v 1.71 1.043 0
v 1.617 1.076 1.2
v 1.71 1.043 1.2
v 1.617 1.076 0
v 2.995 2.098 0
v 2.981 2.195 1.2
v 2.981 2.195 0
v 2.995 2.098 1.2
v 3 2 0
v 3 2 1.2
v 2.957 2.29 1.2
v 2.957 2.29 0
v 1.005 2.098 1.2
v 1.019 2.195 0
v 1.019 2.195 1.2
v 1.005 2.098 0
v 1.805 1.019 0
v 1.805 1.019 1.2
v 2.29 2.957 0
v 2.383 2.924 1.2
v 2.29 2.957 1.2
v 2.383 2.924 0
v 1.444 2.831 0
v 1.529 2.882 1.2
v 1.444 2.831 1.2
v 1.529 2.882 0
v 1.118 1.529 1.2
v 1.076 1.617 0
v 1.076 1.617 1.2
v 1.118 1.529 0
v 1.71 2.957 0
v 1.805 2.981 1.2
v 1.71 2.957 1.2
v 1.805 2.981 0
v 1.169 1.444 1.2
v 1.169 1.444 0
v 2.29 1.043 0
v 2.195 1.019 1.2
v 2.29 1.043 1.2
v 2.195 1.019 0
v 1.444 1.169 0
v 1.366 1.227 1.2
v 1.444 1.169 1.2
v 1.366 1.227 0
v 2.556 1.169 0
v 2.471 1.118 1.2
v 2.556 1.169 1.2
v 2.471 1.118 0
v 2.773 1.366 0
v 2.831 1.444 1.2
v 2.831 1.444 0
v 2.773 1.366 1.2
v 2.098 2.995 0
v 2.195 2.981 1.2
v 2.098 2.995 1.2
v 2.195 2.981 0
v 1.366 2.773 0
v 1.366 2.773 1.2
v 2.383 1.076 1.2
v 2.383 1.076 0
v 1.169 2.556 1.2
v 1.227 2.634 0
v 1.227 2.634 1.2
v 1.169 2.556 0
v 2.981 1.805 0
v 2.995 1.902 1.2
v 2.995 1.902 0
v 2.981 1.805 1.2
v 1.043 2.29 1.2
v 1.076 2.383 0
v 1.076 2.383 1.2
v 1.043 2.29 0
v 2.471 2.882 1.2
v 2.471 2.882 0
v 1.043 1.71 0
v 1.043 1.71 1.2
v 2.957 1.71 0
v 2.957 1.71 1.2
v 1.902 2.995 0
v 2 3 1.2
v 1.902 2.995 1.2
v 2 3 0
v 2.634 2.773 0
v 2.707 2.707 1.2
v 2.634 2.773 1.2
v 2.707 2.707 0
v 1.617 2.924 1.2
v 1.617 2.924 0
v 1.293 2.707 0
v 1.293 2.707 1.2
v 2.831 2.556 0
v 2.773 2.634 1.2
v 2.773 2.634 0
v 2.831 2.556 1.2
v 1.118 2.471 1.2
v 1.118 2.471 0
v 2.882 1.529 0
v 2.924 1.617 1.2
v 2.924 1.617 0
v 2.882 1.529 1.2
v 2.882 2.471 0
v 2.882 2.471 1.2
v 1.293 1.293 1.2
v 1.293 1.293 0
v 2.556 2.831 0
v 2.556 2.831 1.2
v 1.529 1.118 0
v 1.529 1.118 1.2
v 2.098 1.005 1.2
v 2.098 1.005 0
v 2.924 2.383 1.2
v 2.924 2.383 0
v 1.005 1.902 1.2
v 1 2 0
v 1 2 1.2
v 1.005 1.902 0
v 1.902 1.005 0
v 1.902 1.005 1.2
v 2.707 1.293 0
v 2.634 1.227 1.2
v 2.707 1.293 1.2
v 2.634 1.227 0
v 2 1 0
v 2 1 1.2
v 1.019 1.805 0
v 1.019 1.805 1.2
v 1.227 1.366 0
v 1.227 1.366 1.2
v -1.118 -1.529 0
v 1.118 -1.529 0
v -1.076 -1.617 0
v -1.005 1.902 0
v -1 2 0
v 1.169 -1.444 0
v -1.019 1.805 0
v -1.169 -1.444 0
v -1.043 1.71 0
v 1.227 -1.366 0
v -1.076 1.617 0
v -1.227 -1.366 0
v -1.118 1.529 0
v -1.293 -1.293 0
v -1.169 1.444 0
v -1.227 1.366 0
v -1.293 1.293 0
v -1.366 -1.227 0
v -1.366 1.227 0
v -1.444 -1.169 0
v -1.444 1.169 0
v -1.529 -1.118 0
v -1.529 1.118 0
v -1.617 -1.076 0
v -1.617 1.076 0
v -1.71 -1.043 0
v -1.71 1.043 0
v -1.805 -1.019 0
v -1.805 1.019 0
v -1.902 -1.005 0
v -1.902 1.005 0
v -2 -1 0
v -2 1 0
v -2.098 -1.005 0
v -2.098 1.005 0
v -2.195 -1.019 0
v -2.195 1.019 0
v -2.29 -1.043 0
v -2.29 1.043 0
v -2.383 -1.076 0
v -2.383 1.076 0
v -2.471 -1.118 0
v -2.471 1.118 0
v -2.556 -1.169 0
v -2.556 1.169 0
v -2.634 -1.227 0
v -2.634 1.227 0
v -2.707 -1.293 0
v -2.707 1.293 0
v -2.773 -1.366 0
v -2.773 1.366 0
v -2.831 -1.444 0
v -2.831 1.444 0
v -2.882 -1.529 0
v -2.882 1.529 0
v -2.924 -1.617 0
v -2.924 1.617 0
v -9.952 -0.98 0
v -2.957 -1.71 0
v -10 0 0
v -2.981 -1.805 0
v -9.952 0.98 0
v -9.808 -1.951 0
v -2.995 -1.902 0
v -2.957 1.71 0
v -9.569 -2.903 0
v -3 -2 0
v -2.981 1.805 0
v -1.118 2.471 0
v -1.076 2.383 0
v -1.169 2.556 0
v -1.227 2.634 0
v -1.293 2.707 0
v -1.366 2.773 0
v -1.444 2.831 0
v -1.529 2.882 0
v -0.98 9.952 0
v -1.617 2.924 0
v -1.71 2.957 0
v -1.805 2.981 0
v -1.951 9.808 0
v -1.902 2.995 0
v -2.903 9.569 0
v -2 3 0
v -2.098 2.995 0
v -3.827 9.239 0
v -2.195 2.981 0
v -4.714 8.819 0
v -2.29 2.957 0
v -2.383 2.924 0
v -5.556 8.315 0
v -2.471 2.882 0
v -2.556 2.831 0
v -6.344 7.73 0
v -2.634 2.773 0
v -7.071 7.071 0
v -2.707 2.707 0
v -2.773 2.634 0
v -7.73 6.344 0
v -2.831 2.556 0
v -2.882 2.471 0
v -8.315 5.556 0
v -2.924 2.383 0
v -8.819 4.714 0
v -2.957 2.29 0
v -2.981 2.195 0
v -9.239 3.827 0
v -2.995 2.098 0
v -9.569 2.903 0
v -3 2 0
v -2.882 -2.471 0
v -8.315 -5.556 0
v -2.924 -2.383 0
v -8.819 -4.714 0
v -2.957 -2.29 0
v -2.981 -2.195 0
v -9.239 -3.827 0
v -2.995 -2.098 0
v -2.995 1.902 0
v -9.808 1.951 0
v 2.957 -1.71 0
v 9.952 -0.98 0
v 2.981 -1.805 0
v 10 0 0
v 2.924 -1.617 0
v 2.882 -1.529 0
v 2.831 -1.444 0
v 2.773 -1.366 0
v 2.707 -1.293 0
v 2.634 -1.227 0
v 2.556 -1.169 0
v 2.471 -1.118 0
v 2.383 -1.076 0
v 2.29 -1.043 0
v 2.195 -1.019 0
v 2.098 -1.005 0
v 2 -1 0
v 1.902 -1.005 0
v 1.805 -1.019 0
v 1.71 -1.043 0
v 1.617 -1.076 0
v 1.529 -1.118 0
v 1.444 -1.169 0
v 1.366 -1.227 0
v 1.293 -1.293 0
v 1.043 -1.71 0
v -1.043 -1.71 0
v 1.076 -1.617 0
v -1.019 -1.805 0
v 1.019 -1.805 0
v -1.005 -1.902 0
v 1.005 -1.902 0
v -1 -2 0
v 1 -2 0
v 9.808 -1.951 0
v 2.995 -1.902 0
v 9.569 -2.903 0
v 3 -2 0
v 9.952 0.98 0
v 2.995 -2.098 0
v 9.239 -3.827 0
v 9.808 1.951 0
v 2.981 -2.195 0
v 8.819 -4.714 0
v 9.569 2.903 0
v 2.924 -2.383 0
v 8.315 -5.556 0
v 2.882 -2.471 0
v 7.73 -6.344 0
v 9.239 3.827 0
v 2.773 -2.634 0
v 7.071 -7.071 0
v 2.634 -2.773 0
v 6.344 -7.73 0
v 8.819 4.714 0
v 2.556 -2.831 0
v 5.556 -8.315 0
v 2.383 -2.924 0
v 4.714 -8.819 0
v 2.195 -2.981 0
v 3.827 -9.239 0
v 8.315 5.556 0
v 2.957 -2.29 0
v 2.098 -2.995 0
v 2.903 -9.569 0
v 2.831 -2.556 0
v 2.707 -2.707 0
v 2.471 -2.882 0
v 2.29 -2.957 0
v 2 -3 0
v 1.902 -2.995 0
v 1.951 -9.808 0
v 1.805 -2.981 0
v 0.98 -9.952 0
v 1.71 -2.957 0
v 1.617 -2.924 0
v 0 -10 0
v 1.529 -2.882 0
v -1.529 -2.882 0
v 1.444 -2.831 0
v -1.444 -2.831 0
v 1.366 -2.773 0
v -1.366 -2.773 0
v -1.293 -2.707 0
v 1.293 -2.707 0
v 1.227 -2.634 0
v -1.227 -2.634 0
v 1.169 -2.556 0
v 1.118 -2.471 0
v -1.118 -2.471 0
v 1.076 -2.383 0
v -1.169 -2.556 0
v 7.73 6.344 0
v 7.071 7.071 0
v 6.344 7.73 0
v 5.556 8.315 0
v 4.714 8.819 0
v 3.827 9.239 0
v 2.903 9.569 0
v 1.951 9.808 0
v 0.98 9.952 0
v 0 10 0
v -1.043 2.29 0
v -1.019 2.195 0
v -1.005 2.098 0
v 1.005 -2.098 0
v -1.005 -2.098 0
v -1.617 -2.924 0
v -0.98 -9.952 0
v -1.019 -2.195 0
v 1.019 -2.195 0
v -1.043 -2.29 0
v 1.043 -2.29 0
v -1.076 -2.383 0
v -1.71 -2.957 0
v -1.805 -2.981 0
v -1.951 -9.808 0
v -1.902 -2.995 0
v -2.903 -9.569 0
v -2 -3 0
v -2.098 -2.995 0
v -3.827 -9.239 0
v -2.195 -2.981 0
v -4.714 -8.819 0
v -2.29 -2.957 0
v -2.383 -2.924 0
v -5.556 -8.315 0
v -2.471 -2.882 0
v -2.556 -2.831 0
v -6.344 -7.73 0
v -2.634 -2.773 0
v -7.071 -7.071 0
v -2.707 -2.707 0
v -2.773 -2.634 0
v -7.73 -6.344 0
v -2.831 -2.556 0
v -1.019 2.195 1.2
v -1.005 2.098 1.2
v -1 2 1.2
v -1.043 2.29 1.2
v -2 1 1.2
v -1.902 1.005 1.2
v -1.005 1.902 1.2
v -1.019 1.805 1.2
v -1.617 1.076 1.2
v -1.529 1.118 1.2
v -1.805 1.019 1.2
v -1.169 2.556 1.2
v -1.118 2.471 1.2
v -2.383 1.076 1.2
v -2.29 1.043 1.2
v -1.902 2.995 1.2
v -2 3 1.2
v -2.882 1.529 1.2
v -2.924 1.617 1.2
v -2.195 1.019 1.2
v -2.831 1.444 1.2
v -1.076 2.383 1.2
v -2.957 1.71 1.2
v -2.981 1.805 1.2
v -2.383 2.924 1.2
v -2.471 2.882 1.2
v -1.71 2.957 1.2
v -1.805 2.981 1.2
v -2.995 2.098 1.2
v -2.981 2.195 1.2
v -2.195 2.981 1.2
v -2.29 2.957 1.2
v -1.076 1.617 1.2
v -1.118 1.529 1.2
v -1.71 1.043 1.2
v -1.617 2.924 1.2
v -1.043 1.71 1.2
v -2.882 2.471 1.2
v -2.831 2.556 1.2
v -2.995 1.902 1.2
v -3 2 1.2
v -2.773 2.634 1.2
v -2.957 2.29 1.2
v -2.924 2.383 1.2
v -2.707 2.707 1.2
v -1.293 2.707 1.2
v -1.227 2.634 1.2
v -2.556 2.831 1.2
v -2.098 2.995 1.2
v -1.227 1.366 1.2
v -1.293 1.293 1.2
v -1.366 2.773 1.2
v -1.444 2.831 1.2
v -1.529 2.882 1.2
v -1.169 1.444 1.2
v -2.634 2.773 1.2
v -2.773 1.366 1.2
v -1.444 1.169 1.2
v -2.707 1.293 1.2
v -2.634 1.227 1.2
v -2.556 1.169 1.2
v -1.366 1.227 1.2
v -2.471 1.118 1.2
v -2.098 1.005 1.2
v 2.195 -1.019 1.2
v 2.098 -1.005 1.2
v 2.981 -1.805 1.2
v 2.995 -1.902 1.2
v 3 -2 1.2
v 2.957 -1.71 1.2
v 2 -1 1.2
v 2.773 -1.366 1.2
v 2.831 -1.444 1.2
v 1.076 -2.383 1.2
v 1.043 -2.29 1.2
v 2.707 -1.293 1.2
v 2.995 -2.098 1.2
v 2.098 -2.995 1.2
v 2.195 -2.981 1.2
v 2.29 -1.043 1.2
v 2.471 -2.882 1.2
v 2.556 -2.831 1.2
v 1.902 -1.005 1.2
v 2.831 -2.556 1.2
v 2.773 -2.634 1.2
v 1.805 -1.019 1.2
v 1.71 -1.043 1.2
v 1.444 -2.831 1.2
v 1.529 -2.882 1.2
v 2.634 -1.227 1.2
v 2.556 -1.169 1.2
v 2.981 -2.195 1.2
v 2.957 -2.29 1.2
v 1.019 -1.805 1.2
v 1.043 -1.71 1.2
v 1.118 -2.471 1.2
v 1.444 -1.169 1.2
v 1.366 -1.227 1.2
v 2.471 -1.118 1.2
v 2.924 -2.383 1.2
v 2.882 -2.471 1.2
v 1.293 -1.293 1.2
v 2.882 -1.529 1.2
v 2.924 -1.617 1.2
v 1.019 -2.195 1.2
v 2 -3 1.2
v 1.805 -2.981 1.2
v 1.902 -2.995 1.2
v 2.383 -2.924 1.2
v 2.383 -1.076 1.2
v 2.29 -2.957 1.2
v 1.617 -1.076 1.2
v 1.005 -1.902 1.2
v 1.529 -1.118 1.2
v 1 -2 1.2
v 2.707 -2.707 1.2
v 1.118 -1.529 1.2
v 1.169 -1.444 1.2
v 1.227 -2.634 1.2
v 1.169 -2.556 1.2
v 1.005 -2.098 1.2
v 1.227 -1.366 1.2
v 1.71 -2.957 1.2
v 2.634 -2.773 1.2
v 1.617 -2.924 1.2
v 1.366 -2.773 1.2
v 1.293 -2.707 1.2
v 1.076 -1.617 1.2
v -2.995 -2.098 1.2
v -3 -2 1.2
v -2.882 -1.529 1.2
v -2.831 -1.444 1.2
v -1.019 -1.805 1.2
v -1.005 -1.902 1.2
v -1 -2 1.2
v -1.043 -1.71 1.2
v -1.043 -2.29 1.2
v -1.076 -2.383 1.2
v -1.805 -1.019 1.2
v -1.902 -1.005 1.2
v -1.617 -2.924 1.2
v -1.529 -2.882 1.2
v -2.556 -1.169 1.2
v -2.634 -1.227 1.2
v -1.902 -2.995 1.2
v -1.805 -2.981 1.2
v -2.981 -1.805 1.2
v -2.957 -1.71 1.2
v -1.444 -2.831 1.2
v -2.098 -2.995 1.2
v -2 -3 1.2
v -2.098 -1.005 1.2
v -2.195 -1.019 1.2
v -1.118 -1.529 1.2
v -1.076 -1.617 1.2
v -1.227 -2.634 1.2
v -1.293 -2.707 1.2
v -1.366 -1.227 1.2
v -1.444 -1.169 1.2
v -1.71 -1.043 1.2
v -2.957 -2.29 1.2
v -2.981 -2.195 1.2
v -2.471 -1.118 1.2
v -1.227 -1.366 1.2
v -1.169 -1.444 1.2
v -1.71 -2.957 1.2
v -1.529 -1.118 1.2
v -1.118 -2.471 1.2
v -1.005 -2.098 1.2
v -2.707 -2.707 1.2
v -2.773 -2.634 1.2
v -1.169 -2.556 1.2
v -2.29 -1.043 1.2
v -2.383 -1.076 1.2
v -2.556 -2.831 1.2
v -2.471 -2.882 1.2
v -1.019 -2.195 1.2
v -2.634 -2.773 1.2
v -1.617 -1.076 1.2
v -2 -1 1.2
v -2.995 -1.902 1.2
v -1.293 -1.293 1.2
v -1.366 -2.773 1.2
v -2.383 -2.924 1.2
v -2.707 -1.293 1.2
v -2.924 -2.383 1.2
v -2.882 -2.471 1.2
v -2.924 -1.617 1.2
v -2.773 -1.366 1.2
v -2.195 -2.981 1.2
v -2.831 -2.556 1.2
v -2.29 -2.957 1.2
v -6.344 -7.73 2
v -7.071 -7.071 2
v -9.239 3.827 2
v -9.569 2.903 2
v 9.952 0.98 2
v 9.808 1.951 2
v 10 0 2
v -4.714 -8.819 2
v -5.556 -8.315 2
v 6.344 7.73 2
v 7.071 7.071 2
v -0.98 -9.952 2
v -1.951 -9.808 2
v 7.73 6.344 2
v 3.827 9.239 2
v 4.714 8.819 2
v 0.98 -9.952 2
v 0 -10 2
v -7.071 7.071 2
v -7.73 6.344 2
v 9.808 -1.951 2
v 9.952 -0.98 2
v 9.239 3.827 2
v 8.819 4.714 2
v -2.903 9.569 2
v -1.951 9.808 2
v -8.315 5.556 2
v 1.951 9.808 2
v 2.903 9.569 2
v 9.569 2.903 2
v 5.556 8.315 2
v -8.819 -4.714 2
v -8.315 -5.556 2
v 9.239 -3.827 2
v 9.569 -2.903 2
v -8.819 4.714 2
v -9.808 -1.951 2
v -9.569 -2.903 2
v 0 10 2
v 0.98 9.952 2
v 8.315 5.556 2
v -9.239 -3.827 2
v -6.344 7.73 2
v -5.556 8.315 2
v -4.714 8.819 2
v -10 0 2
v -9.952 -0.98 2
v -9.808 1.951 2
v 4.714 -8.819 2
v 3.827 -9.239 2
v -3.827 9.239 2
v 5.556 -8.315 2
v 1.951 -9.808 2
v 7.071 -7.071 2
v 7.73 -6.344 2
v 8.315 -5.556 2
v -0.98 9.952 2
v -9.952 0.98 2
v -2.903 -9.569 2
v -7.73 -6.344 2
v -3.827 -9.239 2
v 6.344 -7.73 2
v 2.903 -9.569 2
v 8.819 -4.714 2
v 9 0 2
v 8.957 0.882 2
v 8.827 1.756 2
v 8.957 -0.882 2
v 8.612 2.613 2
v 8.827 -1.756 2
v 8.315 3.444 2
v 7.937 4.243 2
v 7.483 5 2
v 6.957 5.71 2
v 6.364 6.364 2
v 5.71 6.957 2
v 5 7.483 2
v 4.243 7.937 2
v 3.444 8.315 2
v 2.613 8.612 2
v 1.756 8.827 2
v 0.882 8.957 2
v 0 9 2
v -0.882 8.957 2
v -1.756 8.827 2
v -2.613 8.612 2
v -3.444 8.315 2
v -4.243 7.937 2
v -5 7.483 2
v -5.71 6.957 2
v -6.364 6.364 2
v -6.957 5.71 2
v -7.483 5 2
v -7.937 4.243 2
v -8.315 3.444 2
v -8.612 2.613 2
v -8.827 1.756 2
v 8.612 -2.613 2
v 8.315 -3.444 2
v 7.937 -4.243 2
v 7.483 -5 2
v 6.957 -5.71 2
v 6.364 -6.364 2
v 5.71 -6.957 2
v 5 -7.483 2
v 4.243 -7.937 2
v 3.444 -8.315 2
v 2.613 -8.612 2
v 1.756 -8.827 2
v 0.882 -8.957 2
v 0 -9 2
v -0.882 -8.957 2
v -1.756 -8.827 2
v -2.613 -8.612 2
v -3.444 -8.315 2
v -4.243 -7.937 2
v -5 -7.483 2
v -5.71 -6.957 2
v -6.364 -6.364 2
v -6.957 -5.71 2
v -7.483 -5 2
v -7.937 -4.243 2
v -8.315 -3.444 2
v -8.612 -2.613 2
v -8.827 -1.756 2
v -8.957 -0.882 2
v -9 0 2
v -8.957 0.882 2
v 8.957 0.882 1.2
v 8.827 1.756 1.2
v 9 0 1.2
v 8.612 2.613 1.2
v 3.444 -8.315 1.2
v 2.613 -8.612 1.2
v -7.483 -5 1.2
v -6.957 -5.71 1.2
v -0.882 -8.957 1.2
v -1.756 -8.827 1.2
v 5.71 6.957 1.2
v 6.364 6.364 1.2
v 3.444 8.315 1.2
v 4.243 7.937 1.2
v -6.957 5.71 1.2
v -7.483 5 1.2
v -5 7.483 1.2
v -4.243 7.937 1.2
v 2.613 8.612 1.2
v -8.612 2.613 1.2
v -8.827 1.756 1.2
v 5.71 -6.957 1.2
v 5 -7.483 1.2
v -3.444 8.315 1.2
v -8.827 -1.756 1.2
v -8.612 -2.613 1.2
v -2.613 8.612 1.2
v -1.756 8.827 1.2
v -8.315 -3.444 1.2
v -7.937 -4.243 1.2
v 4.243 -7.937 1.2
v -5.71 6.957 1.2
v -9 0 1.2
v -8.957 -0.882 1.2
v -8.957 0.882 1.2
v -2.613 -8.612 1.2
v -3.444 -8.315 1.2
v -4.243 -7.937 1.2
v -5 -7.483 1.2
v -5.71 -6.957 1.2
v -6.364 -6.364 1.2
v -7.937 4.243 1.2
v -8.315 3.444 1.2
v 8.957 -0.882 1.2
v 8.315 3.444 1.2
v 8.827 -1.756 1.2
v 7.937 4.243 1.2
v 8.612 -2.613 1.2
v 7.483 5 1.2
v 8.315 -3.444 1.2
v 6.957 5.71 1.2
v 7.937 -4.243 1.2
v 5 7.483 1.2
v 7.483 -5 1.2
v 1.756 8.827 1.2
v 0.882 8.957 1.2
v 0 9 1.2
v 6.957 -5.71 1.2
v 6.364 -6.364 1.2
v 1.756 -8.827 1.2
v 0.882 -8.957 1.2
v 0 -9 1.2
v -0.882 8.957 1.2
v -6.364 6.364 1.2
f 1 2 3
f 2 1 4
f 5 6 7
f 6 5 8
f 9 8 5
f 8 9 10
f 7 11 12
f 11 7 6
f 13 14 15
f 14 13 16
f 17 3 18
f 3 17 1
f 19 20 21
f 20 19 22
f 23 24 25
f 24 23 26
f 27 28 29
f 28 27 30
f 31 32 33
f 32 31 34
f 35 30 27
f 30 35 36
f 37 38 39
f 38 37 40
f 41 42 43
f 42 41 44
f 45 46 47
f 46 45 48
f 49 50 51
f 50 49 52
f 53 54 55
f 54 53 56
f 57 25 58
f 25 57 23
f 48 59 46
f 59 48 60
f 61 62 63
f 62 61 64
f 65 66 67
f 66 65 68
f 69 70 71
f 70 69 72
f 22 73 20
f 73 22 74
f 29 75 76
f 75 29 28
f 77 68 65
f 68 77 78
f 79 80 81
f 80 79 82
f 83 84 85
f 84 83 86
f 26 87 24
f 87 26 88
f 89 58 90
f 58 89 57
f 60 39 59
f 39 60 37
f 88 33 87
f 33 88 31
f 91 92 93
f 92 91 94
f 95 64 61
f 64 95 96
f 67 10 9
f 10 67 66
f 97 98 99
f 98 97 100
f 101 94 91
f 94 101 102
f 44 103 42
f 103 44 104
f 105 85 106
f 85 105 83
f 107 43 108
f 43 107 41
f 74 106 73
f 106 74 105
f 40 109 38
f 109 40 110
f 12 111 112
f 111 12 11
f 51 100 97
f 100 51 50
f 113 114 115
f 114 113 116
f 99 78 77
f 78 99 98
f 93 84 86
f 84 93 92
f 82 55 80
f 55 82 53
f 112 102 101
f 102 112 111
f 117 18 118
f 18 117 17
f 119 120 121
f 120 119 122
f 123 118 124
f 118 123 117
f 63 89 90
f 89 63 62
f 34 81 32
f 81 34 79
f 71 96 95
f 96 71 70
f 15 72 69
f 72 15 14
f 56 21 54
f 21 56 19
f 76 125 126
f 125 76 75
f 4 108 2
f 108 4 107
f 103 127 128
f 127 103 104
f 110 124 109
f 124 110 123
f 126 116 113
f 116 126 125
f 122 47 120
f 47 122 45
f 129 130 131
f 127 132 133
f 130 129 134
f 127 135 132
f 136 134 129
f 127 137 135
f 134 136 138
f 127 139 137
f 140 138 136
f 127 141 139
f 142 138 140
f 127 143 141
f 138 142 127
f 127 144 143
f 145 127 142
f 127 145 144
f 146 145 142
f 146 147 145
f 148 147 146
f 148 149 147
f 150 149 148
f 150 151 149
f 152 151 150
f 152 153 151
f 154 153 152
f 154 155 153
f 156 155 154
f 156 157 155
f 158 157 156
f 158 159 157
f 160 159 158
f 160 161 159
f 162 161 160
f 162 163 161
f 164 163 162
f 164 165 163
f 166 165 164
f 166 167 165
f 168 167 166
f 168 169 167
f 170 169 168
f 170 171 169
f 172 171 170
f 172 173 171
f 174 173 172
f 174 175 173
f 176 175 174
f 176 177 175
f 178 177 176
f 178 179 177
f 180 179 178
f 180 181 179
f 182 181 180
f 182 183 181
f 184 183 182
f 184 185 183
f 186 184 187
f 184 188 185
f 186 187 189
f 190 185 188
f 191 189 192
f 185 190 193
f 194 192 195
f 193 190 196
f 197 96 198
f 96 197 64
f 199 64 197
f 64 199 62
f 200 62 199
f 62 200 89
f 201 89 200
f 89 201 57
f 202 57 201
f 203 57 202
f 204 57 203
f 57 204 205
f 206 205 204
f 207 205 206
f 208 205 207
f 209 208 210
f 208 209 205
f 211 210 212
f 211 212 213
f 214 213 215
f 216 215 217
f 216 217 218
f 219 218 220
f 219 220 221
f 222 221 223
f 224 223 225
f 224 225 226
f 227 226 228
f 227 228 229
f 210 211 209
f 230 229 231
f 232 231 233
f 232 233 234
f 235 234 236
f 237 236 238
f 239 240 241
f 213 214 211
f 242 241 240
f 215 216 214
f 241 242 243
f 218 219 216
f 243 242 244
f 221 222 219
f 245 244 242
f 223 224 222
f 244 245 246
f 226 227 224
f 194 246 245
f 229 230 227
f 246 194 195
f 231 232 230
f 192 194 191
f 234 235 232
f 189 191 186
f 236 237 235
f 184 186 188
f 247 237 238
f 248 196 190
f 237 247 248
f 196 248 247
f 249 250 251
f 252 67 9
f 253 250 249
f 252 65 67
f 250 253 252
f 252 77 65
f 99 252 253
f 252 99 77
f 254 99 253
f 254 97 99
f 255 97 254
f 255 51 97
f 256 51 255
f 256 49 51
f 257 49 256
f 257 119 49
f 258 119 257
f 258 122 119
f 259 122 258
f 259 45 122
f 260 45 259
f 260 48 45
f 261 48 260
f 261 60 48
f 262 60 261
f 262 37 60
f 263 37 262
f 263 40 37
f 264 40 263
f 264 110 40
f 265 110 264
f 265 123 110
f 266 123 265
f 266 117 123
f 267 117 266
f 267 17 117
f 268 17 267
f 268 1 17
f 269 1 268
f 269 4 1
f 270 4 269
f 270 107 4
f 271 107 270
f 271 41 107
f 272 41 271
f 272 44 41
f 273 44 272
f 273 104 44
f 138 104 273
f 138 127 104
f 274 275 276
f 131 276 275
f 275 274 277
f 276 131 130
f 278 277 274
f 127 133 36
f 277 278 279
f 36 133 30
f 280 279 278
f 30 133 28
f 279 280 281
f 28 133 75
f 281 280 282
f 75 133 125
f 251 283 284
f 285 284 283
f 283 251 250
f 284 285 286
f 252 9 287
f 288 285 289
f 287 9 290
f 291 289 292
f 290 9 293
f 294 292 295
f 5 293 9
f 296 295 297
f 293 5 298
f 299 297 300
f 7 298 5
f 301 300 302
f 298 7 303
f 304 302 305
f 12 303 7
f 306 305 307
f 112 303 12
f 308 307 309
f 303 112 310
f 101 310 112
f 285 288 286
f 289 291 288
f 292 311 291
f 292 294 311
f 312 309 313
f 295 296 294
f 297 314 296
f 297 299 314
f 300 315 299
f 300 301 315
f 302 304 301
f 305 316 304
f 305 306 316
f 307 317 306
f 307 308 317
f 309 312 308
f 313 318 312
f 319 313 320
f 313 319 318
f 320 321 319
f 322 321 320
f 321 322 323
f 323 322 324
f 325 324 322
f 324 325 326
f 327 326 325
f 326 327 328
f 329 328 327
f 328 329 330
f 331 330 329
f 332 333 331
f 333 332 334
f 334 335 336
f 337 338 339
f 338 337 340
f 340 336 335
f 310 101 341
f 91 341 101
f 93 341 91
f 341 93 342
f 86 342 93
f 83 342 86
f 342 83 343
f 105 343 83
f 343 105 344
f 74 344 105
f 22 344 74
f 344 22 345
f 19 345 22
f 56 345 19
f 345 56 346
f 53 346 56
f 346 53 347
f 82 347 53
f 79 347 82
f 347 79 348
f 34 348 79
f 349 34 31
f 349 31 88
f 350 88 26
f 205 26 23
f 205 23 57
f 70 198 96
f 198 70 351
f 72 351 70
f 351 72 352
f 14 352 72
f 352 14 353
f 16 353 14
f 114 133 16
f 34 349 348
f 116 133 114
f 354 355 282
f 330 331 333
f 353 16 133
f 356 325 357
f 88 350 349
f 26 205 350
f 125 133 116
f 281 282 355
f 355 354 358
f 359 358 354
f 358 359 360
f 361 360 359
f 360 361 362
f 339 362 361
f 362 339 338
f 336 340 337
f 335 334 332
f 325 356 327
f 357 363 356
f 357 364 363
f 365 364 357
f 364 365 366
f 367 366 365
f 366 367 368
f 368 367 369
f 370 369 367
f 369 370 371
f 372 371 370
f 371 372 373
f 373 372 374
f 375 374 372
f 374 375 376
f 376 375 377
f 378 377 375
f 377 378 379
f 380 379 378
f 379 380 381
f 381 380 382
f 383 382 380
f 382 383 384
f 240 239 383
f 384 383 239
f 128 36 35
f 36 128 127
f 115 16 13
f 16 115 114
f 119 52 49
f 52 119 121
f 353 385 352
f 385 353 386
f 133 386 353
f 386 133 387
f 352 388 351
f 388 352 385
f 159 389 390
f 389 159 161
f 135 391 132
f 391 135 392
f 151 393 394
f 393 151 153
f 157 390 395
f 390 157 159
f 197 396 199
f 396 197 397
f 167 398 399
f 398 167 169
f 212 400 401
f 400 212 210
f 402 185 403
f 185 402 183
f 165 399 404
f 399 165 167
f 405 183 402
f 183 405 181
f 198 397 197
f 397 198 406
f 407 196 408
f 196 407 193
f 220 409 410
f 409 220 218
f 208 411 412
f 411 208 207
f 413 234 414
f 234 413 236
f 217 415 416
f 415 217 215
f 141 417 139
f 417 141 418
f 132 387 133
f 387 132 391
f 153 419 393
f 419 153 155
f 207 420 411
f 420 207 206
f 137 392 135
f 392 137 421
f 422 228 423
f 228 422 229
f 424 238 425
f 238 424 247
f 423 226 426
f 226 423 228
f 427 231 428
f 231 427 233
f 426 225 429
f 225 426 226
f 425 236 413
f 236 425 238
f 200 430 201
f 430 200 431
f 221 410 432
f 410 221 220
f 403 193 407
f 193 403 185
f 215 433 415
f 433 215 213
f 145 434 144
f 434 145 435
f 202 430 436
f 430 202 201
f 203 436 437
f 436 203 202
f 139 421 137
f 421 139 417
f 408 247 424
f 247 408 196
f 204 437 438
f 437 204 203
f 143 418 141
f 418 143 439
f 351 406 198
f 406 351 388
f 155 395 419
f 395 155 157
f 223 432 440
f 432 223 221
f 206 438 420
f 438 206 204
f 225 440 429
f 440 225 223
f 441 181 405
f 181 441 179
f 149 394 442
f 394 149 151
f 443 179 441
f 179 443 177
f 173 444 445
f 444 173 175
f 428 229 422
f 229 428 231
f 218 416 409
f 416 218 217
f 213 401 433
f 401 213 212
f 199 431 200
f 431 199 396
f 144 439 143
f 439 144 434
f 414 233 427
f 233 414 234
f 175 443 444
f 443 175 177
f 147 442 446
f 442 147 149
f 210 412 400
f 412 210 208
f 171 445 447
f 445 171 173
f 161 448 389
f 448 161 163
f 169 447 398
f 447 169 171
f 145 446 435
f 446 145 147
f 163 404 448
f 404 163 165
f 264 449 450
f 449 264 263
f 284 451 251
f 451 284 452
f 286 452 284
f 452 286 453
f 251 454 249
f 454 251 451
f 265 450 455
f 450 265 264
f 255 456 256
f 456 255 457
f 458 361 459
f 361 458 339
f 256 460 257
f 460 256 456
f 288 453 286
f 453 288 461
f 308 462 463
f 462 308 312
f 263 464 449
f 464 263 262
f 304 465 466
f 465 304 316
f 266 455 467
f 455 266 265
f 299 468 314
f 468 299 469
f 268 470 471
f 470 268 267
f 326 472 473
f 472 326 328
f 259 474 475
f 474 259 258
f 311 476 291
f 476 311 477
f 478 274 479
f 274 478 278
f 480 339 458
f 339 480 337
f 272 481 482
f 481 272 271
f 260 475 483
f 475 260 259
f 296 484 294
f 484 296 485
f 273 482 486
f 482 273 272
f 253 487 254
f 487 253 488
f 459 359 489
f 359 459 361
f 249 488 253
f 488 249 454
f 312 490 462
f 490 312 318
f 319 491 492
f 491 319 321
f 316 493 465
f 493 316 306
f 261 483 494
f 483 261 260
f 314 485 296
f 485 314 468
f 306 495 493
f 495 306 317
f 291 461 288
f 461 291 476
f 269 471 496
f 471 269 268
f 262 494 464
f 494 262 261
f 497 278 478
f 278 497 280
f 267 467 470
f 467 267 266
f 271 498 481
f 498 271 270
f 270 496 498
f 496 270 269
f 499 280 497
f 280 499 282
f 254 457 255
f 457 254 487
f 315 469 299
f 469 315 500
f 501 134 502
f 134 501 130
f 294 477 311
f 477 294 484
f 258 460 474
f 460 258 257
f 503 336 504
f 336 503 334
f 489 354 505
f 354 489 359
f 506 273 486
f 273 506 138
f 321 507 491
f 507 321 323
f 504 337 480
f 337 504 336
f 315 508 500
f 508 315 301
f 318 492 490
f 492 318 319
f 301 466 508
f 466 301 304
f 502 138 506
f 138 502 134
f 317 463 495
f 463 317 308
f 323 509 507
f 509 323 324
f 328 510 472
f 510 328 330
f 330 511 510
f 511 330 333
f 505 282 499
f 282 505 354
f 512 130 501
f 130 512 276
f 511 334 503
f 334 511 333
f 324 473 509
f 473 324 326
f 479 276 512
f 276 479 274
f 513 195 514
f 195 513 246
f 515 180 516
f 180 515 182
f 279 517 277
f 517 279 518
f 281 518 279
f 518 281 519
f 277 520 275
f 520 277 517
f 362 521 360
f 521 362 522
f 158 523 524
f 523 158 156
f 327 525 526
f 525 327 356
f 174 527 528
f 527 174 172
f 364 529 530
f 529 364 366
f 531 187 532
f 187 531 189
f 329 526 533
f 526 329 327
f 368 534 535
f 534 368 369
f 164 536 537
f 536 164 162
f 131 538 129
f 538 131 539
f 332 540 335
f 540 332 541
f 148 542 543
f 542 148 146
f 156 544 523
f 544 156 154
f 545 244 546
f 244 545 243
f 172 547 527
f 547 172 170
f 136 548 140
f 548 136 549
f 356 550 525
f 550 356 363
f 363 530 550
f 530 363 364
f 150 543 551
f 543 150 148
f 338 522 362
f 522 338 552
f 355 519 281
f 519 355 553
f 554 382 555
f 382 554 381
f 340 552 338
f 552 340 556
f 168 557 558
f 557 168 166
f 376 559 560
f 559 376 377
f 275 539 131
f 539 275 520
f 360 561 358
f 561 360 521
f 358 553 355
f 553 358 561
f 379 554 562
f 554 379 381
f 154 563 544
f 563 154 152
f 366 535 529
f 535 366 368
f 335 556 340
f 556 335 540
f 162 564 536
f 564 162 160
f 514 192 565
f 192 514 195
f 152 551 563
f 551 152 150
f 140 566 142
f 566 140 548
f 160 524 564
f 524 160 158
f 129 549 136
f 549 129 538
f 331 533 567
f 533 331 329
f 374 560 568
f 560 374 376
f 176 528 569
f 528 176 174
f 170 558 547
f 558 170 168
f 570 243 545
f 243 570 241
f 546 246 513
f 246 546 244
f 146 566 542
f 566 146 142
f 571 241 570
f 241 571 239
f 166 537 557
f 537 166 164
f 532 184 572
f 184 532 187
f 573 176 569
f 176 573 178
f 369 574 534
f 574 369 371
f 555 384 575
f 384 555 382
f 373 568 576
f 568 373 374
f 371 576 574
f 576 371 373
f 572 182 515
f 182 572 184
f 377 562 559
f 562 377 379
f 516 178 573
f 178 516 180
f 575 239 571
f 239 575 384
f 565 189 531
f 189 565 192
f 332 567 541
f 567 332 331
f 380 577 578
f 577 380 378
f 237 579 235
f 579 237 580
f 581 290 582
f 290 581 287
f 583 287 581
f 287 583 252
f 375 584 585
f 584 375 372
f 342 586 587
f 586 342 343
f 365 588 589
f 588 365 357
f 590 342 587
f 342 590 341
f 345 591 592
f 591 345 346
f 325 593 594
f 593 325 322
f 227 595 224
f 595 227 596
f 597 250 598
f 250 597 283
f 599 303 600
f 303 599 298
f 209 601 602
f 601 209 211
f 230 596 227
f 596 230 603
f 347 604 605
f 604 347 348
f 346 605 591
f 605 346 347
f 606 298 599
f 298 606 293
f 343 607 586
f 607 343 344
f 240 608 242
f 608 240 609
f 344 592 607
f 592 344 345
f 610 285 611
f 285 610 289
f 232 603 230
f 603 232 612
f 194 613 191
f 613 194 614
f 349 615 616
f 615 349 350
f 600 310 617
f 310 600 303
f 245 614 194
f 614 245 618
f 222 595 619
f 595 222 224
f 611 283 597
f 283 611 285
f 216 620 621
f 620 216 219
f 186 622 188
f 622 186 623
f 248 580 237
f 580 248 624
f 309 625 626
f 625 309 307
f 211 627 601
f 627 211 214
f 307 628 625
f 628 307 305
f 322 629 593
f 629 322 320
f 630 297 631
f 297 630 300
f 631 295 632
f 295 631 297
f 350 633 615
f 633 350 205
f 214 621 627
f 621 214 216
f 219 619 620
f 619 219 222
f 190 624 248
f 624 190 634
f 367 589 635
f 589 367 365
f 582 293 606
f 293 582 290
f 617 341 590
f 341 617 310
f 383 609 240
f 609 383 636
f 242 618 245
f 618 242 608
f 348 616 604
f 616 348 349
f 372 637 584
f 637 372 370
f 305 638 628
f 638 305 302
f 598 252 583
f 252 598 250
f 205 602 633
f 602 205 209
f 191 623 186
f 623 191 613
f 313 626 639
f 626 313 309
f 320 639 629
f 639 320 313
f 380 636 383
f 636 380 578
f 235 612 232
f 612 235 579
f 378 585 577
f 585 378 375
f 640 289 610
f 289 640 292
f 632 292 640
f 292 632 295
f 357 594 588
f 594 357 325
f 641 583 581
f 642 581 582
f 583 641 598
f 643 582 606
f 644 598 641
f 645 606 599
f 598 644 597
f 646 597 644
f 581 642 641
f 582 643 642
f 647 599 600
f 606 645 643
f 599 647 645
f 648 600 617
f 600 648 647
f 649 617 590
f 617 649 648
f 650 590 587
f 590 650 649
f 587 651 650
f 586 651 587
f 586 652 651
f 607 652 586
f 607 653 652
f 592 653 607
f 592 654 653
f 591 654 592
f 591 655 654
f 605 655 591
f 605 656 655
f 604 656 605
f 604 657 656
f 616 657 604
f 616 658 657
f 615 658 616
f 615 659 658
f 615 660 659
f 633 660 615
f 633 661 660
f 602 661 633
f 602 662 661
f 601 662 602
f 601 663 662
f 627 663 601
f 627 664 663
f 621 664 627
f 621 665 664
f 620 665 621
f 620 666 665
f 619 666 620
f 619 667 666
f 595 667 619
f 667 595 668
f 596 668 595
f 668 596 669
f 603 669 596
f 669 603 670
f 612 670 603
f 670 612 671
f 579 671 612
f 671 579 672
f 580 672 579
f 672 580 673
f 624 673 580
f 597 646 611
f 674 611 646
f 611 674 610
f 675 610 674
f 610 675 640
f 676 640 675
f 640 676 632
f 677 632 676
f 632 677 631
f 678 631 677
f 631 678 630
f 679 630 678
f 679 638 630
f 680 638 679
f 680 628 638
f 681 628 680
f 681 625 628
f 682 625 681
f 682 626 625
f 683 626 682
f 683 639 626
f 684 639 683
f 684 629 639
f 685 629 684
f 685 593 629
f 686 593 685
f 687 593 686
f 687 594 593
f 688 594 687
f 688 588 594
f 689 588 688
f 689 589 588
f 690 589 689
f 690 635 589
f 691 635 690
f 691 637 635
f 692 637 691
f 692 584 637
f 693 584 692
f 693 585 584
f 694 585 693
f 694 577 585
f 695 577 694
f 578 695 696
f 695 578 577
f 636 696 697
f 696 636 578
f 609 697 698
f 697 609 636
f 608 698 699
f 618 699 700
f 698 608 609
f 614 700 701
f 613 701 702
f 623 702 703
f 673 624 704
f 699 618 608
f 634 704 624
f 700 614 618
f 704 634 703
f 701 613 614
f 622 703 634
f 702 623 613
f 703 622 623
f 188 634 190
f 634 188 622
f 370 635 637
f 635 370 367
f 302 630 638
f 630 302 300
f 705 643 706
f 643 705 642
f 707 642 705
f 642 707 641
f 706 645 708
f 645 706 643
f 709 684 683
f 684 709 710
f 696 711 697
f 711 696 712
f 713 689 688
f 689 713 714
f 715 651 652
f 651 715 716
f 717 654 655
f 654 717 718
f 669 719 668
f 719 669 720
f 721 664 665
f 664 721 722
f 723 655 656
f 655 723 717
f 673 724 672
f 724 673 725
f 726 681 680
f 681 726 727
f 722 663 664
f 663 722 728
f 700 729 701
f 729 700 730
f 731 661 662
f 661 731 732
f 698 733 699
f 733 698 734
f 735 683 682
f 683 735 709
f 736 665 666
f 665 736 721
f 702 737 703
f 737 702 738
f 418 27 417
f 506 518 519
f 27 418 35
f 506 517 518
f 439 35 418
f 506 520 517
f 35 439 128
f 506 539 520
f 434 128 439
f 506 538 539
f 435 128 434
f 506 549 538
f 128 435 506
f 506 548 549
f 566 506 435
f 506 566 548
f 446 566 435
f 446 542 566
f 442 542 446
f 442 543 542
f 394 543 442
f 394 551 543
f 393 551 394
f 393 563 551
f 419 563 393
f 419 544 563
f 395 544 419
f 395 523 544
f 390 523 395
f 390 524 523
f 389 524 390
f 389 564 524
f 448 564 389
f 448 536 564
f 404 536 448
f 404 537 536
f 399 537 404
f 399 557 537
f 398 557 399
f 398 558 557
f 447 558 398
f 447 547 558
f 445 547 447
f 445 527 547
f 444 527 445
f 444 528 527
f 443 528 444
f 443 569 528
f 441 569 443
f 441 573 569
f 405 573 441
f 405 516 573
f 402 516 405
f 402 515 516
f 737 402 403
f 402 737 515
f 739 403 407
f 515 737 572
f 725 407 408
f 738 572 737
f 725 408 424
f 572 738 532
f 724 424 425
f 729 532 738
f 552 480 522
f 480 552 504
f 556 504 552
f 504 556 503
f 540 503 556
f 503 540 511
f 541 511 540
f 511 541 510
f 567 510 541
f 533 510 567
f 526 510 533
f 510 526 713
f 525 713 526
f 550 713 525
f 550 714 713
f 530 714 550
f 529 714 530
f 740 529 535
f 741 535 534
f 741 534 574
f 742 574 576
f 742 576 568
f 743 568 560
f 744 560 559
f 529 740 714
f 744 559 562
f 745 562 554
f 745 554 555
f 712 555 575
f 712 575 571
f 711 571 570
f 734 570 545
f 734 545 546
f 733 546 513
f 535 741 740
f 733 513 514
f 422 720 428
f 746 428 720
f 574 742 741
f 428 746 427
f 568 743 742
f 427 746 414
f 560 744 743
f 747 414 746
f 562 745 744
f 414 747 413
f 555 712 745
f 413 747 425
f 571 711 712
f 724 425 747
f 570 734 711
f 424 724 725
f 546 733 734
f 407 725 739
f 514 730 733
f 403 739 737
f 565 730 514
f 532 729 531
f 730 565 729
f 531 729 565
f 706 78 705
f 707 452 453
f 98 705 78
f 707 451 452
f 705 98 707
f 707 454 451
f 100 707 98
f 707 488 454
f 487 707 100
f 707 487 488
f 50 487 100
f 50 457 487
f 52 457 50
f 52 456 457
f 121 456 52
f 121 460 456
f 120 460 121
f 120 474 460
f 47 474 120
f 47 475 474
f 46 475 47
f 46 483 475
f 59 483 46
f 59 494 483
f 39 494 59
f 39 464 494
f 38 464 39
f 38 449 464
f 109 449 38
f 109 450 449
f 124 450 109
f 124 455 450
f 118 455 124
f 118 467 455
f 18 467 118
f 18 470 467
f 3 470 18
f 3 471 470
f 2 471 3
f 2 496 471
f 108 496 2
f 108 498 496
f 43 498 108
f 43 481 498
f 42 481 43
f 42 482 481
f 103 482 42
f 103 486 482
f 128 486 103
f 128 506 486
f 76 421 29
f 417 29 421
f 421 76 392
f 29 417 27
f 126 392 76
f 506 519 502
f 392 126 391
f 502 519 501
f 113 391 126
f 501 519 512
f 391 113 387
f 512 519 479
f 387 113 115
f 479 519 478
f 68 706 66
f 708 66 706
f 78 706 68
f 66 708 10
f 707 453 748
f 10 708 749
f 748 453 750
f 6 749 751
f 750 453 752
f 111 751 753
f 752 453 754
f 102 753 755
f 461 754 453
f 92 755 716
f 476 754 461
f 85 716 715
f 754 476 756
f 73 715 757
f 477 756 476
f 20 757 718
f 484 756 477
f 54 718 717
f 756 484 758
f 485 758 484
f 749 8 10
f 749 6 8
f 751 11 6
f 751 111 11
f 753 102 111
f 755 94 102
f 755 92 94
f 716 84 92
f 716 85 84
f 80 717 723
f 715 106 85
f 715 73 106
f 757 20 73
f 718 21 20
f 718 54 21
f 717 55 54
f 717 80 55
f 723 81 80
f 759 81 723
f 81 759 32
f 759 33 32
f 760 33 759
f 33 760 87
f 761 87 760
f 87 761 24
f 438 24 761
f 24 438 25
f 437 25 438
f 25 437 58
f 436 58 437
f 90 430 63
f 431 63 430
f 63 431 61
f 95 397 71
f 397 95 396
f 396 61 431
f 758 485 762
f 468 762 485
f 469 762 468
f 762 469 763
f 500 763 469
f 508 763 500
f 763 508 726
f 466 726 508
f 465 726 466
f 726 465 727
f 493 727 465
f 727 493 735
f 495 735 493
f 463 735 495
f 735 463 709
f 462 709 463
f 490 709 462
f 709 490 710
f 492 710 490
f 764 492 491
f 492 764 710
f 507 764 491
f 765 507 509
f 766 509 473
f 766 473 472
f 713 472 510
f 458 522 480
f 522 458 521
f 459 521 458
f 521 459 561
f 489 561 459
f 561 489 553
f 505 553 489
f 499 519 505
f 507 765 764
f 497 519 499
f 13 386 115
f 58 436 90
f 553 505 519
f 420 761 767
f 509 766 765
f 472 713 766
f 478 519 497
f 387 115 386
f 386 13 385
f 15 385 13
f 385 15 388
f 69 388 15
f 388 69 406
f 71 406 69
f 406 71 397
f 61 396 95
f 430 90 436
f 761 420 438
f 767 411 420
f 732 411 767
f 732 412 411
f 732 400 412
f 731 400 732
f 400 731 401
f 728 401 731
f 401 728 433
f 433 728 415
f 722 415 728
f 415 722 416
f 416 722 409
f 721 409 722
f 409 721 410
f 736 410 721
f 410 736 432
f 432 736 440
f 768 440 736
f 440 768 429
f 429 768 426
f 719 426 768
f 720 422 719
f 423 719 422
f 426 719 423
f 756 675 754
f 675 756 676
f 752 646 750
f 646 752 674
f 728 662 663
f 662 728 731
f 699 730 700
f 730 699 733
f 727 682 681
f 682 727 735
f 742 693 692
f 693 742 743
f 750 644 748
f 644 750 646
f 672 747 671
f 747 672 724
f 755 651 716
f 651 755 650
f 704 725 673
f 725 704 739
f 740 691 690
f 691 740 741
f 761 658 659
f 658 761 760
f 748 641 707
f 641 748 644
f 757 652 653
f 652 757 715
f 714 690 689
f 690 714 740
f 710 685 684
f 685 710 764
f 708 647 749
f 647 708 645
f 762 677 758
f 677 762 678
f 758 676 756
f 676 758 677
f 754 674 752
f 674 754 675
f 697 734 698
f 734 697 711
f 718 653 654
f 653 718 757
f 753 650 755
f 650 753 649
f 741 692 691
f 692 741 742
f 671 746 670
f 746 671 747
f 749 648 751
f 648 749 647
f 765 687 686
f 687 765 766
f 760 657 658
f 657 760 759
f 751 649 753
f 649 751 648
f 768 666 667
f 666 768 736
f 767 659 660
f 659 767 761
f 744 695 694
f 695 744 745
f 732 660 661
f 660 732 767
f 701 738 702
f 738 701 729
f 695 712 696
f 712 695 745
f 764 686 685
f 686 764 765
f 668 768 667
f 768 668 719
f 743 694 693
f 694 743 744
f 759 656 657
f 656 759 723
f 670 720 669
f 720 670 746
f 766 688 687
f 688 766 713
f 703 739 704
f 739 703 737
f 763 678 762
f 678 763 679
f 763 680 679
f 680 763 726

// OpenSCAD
$fn = 64*1;

diameter = 20; //[5:50]
height = 2; //[1:25]
number_of_holes = 4; //[1:5]
hole_diameter = 2; //[1:10]
hole_offset = 2; //[0:10]
lip_ratio = 60; //[0:100]
edge_ratio = 90; //[0:100]

main();

module main(){
	difference(){
		cylinder(h = height, r = diameter/2); 
		if (number_of_holes == 1) {
			oneHole();
		} else if (number_of_holes == 2) {
			twoHoles();
		} else if (number_of_holes == 3) {
			threeHoles();
		} else if (number_of_holes == 4){
			fourHoles();
		} else {
			fiveHoles();
		}
		translate(v=[0,0,height*lip_ratio*.01])
		cylinder(h = 25, r = diameter/2*edge_ratio*.01);
	}
}

module oneHole() {
	cylinder(h=25, r = hole_diameter/2);
}

module twoHoles() {
	translate(v=[hole_offset, 0, 0])
	cylinder(h = 25, r = hole_diameter/2);
	translate(v=[-hole_offset, 0, 0])
	cylinder(h = 25, r = hole_diameter/2);	
}

module threeHoles() {
	translate(v=[0, hole_offset, 0])
	cylinder(h = 25, r = hole_diameter/2);
	translate(v=[.87*hole_offset, -.5*hole_offset, 0])
	cylinder(h = 25, r = hole_diameter/2);
	translate(v=[-.87*hole_offset, -.5*hole_offset, 0])
	cylinder(h = 25, r = hole_diameter/2);	
}

module fourHoles() {
	translate(v=[hole_offset, hole_offset, 0])
	cylinder(h = 25, r = hole_diameter/2);
	translate(v=[-hole_offset, hole_offset, 0])
	cylinder(h = 25, r = hole_diameter/2);	
	translate(v=[hole_offset, -hole_offset, 0])
	cylinder(h = 25, r = hole_diameter/2);
	translate(v=[-hole_offset,-hole_offset,0])
	cylinder(h = 25, r = hole_diameter/2);
}

module fiveHoles() {
	translate(v=[0, hole_offset, 0])
	cylinder(h = 25, r = hole_diameter/2);
	translate(v=[hole_offset*.95, hole_offset*.31, 0])
	cylinder(h = 25, r = hole_diameter/2);	
	translate(v=[hole_offset*.59, -hole_offset*.81, 0])
	cylinder(h = 25, r = hole_diameter/2);
	translate(v=[-hole_offset*.59,-hole_offset*.81,0])
	cylinder(h = 25, r = hole_diameter/2);
	translate(v=[-hole_offset*.95,hole_offset*.31,0])
	cylinder(h = 25, r = hole_diameter/2);
}
